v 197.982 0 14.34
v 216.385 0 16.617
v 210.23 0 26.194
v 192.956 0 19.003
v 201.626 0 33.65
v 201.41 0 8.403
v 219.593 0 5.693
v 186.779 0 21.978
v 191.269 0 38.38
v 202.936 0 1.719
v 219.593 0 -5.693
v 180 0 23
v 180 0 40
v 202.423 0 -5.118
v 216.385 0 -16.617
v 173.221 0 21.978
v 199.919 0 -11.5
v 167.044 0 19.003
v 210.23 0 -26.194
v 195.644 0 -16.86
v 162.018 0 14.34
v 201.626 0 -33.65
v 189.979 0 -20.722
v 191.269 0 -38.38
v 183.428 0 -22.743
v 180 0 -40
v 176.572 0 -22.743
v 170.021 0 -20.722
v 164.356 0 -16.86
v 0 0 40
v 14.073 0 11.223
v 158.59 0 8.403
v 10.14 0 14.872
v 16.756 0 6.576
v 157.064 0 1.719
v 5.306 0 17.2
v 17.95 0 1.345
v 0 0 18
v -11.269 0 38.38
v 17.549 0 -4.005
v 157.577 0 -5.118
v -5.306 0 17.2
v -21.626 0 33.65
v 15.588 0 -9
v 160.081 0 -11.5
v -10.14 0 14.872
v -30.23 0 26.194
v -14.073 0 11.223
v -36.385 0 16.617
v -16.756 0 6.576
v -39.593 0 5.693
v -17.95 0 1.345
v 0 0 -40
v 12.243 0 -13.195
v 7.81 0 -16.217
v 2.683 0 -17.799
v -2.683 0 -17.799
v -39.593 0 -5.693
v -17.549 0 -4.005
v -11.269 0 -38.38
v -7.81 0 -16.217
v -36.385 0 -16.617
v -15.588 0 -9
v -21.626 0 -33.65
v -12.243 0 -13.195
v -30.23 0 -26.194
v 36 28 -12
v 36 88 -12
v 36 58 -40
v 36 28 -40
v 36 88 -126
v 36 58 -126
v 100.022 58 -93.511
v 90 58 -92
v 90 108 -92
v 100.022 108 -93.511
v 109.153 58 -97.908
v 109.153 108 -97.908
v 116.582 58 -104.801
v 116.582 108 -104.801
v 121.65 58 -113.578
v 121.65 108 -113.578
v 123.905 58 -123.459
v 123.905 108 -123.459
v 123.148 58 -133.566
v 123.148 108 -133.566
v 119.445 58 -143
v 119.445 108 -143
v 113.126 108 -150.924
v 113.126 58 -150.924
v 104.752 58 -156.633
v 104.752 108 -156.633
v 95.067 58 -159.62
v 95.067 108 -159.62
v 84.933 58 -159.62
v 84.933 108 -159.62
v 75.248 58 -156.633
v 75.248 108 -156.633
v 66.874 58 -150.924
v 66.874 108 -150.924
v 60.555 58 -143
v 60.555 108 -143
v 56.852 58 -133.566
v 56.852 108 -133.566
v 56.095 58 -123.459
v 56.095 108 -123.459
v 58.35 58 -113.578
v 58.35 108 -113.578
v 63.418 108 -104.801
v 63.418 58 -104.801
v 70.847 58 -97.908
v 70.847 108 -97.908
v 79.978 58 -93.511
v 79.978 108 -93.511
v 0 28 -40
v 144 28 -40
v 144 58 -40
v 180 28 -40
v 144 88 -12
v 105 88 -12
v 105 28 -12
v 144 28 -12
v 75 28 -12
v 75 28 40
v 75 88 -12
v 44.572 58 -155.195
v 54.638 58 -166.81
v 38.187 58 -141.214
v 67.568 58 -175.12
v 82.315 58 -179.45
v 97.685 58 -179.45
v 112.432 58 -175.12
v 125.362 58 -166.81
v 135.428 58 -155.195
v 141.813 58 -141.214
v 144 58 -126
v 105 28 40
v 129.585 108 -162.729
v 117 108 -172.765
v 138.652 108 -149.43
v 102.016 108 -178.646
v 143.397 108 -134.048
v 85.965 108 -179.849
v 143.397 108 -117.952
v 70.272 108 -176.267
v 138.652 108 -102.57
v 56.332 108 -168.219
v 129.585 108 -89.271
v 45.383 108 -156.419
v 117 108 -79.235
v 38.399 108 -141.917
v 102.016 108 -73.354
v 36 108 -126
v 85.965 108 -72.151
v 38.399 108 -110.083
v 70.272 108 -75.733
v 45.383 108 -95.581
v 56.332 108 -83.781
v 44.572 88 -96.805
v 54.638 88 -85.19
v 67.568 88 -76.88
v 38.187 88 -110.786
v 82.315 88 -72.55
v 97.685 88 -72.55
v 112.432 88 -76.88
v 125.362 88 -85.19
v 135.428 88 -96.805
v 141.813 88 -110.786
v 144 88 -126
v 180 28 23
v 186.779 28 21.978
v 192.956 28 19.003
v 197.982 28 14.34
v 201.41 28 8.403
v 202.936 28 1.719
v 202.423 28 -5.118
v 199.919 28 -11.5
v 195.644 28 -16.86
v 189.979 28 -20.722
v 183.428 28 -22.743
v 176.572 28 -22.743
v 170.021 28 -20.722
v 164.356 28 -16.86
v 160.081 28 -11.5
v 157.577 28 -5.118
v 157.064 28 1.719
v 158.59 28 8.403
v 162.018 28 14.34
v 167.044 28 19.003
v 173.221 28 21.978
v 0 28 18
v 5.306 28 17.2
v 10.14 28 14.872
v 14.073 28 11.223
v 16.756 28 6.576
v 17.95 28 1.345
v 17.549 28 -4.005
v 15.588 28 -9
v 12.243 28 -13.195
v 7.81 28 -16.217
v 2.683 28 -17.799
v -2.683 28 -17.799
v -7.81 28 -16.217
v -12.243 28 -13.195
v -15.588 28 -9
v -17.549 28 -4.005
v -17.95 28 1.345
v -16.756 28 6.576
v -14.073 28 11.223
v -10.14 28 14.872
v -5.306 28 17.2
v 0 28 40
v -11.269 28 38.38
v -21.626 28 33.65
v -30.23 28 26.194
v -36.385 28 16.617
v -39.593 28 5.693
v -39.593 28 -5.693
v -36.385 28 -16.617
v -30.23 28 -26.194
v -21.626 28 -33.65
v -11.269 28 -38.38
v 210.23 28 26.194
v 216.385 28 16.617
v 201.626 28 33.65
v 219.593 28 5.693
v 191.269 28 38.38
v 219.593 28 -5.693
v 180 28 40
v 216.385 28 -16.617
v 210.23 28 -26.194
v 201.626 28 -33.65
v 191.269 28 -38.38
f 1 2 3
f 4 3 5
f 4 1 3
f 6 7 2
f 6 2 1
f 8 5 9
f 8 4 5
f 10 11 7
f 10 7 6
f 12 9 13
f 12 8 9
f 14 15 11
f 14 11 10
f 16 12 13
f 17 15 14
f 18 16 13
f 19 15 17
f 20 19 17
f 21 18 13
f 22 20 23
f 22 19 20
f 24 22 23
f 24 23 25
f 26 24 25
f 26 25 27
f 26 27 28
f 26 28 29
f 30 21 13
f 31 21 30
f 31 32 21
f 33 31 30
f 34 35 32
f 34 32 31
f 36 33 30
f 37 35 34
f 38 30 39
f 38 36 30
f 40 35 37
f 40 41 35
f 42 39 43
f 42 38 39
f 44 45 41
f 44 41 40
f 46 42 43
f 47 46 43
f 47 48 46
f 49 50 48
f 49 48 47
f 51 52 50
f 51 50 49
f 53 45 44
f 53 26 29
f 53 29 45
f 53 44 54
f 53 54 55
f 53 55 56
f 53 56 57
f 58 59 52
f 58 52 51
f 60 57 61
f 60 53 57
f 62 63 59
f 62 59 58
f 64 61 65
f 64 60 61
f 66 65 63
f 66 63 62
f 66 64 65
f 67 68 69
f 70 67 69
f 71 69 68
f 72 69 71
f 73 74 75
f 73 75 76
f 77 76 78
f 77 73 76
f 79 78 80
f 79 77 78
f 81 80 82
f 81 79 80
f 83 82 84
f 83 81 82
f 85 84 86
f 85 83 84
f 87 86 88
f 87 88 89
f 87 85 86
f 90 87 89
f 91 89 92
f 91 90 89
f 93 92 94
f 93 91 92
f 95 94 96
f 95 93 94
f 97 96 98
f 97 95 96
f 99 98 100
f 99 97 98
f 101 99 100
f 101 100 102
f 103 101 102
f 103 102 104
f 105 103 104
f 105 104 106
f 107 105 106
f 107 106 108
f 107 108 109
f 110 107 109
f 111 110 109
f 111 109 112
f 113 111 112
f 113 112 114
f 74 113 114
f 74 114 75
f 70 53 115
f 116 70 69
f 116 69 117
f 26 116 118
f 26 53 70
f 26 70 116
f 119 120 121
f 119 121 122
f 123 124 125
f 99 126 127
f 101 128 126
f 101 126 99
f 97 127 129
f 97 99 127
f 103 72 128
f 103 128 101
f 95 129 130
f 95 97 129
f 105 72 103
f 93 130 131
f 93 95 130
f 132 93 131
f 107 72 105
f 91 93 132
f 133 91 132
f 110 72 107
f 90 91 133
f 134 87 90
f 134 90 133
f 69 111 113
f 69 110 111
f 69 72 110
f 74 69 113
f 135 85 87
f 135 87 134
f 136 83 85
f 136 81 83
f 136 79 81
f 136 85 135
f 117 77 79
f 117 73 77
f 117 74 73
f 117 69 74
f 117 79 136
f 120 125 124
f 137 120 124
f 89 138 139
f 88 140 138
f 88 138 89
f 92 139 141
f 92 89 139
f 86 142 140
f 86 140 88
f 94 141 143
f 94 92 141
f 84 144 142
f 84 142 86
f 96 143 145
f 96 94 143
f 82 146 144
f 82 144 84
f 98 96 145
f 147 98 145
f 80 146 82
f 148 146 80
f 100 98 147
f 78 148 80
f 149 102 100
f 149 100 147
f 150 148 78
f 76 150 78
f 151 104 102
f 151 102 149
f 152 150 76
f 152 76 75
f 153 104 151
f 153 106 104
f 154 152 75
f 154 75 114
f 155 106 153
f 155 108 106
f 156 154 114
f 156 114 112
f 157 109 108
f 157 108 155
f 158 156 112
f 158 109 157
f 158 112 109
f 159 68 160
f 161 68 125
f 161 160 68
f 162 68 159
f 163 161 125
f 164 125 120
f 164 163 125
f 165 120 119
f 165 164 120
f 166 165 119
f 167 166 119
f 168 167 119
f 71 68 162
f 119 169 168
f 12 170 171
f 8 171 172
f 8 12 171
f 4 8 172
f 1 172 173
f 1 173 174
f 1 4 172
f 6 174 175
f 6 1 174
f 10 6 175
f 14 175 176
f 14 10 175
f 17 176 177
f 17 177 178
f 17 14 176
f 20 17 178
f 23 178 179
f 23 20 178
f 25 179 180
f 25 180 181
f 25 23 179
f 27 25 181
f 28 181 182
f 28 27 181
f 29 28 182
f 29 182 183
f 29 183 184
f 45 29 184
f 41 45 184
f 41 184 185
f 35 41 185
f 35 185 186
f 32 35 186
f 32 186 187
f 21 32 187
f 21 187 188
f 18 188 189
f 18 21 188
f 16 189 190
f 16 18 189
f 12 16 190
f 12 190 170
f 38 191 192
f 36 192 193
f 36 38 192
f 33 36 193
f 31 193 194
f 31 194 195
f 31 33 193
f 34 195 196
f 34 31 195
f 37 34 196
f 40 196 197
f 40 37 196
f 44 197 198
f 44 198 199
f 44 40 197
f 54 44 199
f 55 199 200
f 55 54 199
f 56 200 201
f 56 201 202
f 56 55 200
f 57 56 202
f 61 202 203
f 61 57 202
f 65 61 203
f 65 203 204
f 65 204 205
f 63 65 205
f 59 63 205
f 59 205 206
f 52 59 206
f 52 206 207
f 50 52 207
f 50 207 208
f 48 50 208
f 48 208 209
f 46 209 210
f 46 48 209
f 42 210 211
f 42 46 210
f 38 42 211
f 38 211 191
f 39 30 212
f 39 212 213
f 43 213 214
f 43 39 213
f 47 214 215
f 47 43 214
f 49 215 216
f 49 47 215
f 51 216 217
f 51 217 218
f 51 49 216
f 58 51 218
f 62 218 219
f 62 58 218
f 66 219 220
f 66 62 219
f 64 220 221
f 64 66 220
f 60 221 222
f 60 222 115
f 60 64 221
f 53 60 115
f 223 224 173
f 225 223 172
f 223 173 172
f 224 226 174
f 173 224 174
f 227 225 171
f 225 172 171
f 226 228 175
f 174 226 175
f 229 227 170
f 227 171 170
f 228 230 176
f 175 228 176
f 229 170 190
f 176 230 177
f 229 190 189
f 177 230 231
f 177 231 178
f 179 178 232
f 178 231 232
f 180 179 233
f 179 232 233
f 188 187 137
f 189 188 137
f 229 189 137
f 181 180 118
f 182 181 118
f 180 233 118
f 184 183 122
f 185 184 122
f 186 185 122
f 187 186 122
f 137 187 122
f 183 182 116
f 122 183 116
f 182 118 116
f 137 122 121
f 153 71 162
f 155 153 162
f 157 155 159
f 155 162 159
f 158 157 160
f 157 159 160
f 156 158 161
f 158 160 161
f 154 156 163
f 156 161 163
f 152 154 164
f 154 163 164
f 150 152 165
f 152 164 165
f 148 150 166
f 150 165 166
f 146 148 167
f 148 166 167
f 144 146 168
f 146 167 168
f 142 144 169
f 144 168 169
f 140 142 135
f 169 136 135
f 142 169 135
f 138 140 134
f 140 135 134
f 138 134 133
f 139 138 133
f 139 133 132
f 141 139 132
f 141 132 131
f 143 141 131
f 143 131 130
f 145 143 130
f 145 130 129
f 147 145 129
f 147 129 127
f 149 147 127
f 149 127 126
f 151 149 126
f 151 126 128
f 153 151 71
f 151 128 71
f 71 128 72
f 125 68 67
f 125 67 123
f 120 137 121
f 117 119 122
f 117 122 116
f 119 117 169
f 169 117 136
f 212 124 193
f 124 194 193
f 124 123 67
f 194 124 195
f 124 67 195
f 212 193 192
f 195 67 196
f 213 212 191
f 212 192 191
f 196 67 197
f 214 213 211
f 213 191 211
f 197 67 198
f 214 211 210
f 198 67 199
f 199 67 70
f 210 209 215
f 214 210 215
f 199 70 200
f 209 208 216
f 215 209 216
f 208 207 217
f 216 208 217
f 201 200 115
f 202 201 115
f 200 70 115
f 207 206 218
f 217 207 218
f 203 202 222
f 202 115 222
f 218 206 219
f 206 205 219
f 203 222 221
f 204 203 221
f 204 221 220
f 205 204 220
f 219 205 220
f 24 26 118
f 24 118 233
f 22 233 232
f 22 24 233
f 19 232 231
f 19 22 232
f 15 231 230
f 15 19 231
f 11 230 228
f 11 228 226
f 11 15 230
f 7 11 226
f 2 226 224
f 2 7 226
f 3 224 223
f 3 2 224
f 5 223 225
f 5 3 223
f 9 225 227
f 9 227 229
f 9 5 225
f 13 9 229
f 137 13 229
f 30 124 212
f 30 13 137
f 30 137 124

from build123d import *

# Parameters (mm, degrees)
SKETCH_1_R          = 23
SKETCH_1_R_2        = 18
EXTRUDE_1_DEPTH     = 28
EXTRUDE_3_DEPTH     = 60
SKETCH_2_5_R        = 54
SKETCH_2_5_R_2      = 34
EXTRUDE_4_DEPTH     = 80
CUT_EXTRUDE_1_DEPTH = 30
SKETCH_6_W          = 108
SKETCH_6_H          = 28
EXTRUDE_5_DEPTH     = 60
EXTRUDE_6_DEPTH     = 15


with BuildPart() as part:
    # 草图1 → 凸台-拉伸1 (new body)
    with BuildSketch(Plane(origin=(0, 0, 0), x_dir=(1, 0, 0), z_dir=(0, 1, 0))):
        with BuildLine():
            Line((0, 40), (180, 40))
            ThreePointArc((180, 40), (220, 0), (180, -40))
            Line((180, -40), (0, -40))
            ThreePointArc((0, -40), (-40, 0), (0, 40))
        make_face()
        with Locations(Location((180, 0, 0), (0, 0, 270))):
            Circle(SKETCH_1_R, mode=Mode.SUBTRACT)
        with Locations(Location((0, 0, 0), (0, 0, 270))):
            Circle(SKETCH_1_R_2, mode=Mode.SUBTRACT)
    extrude(amount=EXTRUDE_1_DEPTH)



with BuildPart() as body_2:
    # 草图2 → 凸台-拉伸3 (new body)
    with BuildSketch(Plane(origin=(0, 28, 0), x_dir=(1, 0, 0), z_dir=(0, 1, 0))):
        with BuildLine():
            Line((90, 40), (144, 40))
            Line((144, 40), (144, 126))
            ThreePointArc((144, 126), (90, 72), (36, 126))
            Line((36, 126), (36, 40))
            Line((36, 40), (90, 40))
        make_face()
    extrude(amount=EXTRUDE_3_DEPTH)

    # 草图2<5> → 凸台-拉伸4 (add)
    with BuildSketch(Plane(origin=(0, 28, 0), x_dir=(1, 0, 0), z_dir=(0, 1, 0))):
        with Locations(Location((90, 126, 0), (0, 0, 180))):
            Circle(SKETCH_2_5_R)
        with Locations(Location((90, 126, 0), (0, 0, 270))):
            Circle(SKETCH_2_5_R_2, mode=Mode.SUBTRACT)
    extrude(amount=EXTRUDE_4_DEPTH)

    # 草图4 → 切除-拉伸1 (cut)
    with BuildSketch(Plane.XZ.offset(-28)):
        with BuildLine():
            Line((36, -40), (36, -126))
            ThreePointArc((36, -126), (90, -180), (144, -126))
            Line((144, -126), (144, -40))
            Line((144, -40), (36, -40))
        make_face()
    extrude(amount=-CUT_EXTRUDE_1_DEPTH, mode=Mode.SUBTRACT)


with BuildPart() as part_1:
    add(part.part)

    add(body_2.part)  # 凸台-拉伸5 merges body 2
    # 草图6 → 凸台-拉伸5 (add)
    with BuildSketch(Plane(origin=(0, 28, 0), x_dir=(1, 0, 0), z_dir=(0, 1, 0))):
        with Locations((90, 26)):
            Rectangle(SKETCH_6_W, SKETCH_6_H)
    extrude(amount=EXTRUDE_5_DEPTH)

    # 草图7 → 凸台-拉伸6 (add, symmetric)
    with BuildSketch(Plane.ZY.offset(-90)):
        Polygon((40, 28), (-12, 28), (-12, 88), align=None)
    extrude(amount=EXTRUDE_6_DEPTH, both=True)


solid = part_1.part
